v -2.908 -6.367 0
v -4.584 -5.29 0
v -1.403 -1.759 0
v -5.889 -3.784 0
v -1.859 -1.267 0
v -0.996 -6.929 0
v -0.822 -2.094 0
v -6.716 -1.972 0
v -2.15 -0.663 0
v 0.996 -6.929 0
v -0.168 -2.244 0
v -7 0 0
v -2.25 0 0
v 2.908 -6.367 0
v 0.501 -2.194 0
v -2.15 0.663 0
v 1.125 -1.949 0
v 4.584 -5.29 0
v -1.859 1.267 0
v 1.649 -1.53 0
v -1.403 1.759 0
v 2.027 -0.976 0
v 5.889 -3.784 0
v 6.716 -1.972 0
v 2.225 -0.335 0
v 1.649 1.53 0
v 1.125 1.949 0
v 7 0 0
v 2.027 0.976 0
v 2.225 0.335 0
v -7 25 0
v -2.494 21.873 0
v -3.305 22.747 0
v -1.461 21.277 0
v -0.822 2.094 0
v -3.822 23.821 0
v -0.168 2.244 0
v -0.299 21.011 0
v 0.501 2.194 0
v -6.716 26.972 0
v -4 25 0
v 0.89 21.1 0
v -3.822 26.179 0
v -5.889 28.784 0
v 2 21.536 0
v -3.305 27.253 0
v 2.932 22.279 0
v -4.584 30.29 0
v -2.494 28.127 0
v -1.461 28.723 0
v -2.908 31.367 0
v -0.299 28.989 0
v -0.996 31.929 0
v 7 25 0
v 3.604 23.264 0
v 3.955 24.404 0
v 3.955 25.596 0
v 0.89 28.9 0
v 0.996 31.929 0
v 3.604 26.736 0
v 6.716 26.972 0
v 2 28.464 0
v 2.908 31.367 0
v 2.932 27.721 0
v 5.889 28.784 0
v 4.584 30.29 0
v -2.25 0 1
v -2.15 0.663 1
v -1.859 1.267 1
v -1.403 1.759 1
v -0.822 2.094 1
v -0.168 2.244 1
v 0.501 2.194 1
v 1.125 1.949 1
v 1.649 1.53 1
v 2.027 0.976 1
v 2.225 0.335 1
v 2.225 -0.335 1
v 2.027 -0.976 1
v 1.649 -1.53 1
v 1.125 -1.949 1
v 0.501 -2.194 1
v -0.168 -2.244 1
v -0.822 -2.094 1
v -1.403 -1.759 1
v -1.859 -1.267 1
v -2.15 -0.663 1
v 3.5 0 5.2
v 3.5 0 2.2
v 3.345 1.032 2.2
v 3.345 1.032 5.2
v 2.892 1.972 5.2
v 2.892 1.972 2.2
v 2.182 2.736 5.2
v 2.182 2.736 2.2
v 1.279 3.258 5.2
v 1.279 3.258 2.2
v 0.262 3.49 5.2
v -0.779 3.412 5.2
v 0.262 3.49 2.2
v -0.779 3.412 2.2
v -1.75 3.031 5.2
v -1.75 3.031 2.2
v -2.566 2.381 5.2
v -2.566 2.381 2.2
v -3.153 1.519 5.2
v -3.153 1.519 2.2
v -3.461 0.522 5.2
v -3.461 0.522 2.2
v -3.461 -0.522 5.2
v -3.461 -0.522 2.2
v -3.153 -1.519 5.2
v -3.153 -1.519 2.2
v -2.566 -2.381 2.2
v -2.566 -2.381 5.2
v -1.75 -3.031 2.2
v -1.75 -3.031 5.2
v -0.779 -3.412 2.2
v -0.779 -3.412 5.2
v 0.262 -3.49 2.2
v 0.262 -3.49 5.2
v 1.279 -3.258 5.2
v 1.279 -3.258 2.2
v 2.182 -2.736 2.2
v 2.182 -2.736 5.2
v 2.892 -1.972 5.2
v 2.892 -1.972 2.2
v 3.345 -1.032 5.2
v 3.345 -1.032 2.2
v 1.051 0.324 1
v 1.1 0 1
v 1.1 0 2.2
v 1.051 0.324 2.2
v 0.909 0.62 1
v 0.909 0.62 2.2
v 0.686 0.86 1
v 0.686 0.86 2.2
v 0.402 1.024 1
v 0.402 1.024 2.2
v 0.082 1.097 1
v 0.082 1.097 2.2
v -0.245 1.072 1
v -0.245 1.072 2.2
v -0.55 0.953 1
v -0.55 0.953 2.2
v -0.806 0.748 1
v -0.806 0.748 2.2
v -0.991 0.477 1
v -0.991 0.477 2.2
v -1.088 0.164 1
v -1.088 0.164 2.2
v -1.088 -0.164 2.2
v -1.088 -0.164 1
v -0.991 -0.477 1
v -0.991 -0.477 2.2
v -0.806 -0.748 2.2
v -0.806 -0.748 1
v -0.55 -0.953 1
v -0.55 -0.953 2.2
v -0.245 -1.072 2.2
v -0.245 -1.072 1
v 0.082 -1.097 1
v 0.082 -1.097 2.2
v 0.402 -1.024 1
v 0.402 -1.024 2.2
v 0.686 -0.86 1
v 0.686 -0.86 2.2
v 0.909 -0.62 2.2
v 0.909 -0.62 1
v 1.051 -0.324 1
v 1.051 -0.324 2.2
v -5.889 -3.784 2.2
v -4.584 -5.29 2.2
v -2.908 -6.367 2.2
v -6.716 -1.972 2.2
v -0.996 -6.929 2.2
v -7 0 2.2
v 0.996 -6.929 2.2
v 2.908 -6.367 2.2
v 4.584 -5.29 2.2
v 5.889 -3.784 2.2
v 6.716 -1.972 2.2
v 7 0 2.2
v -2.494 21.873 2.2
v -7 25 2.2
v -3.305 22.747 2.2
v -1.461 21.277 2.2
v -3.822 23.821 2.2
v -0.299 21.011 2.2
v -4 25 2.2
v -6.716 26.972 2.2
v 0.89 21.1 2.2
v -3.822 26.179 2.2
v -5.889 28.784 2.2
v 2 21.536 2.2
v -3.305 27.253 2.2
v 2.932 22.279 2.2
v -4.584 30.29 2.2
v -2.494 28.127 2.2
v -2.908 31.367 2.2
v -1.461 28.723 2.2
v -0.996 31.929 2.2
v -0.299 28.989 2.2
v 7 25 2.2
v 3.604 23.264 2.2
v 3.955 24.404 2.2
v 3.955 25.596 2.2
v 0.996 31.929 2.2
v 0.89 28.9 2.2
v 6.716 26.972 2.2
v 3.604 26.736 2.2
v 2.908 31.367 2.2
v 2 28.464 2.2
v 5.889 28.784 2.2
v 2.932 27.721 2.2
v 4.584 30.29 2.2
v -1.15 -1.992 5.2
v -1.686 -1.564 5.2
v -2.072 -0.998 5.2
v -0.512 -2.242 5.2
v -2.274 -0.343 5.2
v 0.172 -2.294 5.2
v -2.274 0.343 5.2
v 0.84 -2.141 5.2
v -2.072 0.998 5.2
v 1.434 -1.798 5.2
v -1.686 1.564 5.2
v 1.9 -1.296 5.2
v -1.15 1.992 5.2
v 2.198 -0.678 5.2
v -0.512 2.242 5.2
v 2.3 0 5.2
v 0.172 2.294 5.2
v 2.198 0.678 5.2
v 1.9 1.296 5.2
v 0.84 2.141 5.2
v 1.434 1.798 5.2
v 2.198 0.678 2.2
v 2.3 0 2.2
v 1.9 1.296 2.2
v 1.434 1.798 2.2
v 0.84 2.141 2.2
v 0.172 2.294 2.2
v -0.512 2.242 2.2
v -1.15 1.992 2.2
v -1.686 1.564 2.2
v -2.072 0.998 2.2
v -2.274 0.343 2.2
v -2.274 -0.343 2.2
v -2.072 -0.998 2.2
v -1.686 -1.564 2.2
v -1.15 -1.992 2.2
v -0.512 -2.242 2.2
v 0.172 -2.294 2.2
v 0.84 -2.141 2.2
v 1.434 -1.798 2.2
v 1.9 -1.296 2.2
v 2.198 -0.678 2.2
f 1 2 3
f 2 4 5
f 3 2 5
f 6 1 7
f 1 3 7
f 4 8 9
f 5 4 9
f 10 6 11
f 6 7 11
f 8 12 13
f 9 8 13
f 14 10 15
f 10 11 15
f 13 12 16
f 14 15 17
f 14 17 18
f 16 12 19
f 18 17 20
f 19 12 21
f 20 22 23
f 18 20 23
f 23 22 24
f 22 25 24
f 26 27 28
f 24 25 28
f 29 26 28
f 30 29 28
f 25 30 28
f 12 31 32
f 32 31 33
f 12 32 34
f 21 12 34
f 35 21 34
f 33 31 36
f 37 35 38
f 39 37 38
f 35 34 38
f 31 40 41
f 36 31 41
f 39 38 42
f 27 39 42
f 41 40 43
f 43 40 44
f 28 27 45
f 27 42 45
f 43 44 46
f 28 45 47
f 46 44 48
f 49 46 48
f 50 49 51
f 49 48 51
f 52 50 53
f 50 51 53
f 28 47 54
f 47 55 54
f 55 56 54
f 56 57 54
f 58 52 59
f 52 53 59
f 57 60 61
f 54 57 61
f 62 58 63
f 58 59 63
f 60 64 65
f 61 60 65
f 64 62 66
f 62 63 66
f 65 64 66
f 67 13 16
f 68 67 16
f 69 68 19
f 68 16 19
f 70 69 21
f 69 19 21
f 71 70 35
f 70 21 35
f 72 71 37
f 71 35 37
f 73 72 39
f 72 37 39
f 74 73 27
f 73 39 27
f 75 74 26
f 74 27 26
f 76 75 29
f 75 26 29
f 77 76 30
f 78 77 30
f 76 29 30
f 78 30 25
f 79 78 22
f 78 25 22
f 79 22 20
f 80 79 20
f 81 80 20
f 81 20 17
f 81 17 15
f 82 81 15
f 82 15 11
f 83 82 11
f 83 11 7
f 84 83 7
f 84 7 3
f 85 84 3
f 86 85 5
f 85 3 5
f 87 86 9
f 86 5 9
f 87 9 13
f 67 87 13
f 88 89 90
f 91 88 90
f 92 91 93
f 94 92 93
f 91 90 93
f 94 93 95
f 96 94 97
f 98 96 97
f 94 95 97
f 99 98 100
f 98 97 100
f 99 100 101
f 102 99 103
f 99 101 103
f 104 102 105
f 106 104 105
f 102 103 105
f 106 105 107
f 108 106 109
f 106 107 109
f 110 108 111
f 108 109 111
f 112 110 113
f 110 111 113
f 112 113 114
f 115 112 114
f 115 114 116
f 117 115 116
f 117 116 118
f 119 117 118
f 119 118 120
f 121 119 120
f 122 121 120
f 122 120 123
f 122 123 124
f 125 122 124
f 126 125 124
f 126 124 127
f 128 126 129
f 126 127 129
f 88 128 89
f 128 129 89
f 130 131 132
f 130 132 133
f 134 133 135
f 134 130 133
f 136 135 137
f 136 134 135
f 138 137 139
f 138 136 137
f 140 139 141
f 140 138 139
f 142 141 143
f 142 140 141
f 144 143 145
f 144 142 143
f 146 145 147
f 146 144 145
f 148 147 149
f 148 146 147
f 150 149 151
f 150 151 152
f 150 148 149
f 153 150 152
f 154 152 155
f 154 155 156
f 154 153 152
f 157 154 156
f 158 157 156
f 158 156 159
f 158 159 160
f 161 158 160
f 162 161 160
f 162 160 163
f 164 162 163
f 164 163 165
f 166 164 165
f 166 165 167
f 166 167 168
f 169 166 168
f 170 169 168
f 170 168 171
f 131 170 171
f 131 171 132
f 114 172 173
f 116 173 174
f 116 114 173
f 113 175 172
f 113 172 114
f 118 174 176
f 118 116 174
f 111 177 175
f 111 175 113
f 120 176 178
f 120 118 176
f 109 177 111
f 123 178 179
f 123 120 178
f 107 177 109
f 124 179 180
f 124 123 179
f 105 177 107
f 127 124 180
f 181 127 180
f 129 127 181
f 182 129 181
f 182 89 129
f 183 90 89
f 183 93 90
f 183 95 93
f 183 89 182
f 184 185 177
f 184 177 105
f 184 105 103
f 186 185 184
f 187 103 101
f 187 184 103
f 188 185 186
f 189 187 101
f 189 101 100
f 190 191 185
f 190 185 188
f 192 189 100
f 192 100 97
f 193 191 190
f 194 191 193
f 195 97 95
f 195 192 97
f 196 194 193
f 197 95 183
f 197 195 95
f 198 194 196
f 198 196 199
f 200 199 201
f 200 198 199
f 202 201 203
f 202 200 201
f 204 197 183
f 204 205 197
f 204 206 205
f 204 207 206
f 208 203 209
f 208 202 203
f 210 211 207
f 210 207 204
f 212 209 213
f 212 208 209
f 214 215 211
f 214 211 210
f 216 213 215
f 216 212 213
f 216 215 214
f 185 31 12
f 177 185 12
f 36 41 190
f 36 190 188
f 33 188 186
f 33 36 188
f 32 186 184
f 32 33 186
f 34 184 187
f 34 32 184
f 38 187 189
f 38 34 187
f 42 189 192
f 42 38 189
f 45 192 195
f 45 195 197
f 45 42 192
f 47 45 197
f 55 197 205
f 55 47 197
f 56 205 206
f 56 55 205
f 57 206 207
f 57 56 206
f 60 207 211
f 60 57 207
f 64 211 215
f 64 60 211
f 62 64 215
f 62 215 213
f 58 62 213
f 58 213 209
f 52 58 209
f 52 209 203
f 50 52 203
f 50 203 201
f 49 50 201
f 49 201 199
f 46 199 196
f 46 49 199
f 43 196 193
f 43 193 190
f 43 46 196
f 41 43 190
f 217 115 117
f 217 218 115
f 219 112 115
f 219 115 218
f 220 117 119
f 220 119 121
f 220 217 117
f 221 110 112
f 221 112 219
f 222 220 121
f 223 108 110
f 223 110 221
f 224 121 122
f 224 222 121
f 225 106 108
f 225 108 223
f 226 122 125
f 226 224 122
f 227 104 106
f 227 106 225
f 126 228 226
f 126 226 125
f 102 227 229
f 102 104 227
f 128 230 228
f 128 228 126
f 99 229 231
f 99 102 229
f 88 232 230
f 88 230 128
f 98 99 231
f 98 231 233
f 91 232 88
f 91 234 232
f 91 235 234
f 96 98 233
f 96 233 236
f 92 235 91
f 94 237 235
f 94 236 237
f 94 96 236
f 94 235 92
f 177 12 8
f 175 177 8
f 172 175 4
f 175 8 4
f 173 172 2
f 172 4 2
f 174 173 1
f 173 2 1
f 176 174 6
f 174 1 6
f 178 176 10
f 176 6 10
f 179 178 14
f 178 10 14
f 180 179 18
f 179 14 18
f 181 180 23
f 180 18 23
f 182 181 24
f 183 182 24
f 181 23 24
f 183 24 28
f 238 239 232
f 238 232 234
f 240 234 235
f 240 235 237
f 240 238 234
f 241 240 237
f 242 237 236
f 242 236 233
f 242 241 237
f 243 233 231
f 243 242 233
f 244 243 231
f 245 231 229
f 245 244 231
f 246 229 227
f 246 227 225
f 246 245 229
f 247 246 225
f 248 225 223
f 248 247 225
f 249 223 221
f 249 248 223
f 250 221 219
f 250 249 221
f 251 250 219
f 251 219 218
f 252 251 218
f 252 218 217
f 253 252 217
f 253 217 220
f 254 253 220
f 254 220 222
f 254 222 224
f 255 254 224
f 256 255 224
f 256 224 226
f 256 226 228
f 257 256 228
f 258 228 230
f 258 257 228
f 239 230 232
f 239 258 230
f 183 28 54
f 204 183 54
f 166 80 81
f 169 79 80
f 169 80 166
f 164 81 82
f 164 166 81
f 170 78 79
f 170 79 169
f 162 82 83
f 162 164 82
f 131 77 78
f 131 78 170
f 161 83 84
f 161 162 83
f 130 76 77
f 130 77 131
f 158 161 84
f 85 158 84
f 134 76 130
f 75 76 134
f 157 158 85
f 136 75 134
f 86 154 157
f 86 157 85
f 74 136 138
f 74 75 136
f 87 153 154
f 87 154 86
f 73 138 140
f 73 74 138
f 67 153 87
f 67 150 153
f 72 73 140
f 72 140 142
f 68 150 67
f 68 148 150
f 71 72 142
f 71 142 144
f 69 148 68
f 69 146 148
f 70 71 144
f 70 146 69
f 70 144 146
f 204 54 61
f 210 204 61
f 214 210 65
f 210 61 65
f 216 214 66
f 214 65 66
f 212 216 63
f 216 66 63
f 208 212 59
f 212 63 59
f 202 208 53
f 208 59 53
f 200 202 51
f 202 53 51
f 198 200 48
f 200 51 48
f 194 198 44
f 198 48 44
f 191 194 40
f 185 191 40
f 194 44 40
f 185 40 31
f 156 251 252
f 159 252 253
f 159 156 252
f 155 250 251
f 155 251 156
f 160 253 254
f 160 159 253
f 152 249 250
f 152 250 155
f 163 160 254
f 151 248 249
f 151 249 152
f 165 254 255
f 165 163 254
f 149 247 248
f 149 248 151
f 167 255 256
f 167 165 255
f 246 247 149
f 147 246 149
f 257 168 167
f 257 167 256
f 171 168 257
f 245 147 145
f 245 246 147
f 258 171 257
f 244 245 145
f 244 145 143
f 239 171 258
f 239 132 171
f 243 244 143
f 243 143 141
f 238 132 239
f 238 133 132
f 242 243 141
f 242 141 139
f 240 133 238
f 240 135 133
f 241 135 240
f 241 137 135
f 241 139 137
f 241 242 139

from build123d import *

# Parameters (mm, degrees)
CROQUIS1_R              = 1.1
SALIENTE_EXTRUIR1_DEPTH = 2.2
CROQUIS2_R              = 3.5
CROQUIS2_R_2            = 2.3
SALIENTE_EXTRUIR2_DEPTH = 3
CROQUIS3_R              = 2.25
CORTAR_EXTRUIR1_DEPTH   = 1


with BuildPart() as part:
    # Croquis1 → Saliente-Extruir1 (new body)
    with BuildSketch(Plane.XY):
        with BuildLine():
            Line((-7, 25), (-7, 0))
            ThreePointArc((-7, 0), (0, -7), (7, 0))
            Line((7, 0), (7, 25))
            ThreePointArc((7, 25), (0, 32), (-7, 25))
        make_face()
        Circle(CROQUIS1_R, mode=Mode.SUBTRACT)
        with BuildLine():
            ThreePointArc((4, 25), (0, 29), (-4, 25))
            ThreePointArc((-4, 25), (0, 21), (4, 25))
        make_face(mode=Mode.SUBTRACT)
    extrude(amount=SALIENTE_EXTRUIR1_DEPTH)

    # Croquis2 → Saliente-Extruir2 (add)
    with BuildSketch(Plane.XY.offset(2.2)):
        Circle(CROQUIS2_R)
        Circle(CROQUIS2_R_2, mode=Mode.SUBTRACT)
    extrude(amount=SALIENTE_EXTRUIR2_DEPTH)

    # Croquis3 → Cortar-Extruir1 (cut)
    with BuildSketch(Plane(origin=(0, 0, 0), x_dir=(-1, 0, 0), z_dir=(0, 0, -1))):
        Circle(CROQUIS3_R)
    extrude(amount=-CORTAR_EXTRUIR1_DEPTH, mode=Mode.SUBTRACT)


solid = part.part
